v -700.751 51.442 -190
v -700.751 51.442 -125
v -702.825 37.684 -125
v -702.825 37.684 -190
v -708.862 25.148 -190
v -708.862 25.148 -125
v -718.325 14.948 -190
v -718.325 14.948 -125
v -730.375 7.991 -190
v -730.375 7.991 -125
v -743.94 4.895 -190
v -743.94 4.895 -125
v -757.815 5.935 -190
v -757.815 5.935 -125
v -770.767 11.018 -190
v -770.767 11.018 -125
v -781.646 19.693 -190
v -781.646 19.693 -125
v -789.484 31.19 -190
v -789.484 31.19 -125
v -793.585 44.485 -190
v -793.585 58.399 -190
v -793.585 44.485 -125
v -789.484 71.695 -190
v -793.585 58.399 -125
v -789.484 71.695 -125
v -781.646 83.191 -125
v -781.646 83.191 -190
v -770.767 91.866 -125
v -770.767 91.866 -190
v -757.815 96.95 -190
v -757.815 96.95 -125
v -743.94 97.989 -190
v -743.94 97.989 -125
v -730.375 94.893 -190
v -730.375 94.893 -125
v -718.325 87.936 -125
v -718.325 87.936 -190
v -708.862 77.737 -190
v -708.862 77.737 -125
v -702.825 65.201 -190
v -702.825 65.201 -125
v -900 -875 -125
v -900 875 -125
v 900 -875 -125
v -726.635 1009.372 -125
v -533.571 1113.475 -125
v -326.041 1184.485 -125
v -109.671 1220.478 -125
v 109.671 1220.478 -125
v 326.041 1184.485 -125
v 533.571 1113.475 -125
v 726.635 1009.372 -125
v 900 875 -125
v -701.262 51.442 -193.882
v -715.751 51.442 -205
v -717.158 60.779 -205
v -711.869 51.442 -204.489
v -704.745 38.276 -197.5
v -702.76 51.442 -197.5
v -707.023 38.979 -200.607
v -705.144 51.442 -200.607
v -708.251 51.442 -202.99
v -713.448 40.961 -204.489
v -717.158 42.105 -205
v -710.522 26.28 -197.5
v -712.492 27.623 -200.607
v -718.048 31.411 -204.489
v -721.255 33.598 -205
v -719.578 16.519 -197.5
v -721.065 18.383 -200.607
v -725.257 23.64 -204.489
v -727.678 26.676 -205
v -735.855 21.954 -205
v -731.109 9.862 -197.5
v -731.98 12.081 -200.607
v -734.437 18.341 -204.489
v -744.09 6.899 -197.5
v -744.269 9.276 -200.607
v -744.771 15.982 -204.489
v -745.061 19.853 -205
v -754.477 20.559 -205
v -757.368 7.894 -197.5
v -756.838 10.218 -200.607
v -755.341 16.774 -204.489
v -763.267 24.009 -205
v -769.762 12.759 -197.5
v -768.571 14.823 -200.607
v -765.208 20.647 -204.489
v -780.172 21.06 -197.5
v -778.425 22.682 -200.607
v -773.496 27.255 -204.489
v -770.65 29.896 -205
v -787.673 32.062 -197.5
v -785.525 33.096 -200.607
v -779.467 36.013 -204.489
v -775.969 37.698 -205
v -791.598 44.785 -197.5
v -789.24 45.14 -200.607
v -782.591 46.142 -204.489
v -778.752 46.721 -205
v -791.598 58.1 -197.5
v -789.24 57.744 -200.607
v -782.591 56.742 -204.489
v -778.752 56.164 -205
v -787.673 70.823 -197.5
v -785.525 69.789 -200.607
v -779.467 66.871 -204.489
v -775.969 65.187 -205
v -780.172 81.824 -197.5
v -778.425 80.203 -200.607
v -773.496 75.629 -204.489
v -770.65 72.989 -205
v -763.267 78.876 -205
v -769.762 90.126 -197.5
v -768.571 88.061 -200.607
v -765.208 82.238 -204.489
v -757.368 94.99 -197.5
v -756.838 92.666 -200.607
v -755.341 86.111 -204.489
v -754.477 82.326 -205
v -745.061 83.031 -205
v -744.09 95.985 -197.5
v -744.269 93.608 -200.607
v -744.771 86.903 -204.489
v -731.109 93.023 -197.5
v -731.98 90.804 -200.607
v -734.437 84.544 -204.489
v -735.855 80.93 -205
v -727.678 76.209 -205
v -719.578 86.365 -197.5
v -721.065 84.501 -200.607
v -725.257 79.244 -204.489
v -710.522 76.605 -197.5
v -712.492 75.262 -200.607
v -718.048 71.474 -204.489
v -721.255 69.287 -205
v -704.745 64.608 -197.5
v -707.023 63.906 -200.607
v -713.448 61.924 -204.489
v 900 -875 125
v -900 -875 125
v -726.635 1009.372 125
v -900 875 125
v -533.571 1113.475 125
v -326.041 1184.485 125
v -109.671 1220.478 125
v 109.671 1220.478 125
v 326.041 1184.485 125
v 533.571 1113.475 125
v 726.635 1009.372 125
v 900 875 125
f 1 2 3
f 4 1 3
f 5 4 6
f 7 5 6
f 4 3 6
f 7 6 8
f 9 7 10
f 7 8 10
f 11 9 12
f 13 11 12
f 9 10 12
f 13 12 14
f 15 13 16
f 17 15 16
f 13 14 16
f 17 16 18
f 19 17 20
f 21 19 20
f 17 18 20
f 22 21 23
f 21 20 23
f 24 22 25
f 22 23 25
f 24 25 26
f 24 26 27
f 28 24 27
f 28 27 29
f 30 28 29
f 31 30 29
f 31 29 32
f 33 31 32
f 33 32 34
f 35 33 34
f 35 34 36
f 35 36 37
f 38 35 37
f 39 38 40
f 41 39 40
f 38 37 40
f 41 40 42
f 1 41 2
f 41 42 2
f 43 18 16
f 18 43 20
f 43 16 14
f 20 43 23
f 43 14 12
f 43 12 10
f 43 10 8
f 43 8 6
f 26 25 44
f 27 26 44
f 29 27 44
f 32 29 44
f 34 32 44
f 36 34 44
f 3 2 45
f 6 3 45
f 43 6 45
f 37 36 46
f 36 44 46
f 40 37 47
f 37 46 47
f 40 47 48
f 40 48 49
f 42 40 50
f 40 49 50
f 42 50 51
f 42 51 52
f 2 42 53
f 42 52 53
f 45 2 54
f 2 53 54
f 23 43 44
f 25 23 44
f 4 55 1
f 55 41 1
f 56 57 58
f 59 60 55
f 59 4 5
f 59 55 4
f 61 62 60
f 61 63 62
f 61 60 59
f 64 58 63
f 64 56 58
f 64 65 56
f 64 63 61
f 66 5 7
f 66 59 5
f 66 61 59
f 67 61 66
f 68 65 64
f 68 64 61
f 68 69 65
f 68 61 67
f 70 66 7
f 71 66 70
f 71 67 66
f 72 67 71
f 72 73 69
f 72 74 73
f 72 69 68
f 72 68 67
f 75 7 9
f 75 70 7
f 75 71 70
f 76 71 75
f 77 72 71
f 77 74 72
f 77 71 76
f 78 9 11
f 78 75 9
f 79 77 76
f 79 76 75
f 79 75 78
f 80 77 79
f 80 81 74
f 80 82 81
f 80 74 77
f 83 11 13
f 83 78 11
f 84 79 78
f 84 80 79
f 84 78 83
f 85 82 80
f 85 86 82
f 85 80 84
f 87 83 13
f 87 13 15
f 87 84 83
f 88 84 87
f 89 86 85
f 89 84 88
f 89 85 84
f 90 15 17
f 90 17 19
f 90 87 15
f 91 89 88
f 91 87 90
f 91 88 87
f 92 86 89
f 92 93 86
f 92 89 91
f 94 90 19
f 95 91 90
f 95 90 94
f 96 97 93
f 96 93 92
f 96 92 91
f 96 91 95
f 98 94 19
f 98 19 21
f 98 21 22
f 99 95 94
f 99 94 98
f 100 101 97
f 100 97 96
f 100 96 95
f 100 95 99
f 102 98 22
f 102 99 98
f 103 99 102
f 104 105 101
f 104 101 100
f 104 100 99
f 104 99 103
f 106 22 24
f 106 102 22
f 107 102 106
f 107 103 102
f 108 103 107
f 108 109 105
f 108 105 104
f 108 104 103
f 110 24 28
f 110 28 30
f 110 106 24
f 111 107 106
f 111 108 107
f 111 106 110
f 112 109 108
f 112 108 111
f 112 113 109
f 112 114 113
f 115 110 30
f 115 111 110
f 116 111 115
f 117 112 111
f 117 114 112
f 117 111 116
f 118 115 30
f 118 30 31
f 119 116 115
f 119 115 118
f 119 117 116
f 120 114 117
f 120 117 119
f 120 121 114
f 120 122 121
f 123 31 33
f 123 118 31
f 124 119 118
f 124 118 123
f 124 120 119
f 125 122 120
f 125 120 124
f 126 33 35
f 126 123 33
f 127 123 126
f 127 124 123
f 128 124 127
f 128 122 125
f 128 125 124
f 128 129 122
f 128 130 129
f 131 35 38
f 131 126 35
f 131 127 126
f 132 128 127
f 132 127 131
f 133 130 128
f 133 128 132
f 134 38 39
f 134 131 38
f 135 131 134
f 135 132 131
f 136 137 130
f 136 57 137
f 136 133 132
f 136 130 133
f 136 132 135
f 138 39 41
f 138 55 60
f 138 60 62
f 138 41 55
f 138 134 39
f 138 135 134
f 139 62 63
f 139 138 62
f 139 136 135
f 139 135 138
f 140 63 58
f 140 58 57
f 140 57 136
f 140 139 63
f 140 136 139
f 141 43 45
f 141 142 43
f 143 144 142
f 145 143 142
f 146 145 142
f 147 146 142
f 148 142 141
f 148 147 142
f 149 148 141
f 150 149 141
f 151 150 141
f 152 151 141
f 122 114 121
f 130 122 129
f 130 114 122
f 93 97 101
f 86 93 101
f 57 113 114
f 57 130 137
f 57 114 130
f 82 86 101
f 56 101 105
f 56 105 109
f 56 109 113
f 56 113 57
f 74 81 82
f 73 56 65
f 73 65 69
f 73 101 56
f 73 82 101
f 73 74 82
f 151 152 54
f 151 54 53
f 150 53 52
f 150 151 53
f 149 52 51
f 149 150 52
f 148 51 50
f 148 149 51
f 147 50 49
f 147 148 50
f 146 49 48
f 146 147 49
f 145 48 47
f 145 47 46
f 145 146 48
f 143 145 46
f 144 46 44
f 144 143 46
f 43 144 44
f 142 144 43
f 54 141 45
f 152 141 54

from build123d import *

# Parameters (mm, degrees)
F1_DEPTH = 125
F2_R     = 46.677597
F3_DEPTH = 80
F4_R     = 15


with BuildPart() as f1:
    # F0 (on Top) → F1 (new body, symmetric)
    with BuildSketch(Plane.XY):
        with BuildLine():
            Line((-900, -875), (900, -875))
            Line((900, -875), (900, 875))
            ThreePointArc((900, 875), (0, 1225), (-900, 875))
            Line((-900, 875), (-900, -875))
        make_face()
    extrude(amount=F1_DEPTH, both=True)

    # F2 (on face) → F3 (join)
    with BuildSketch(Plane(origin=(0, 0, -125), x_dir=(1, 0, 0), z_dir=(0, 0, -1))):
        with Locations((-747.428477, -51.44228)):
            Circle(F2_R)
    extrude(amount=F3_DEPTH)

    # F4
    f4_edges = [f1.edges().sort_by_distance(p)[0] for p in [
        (-794.106074, 51.44228, -205),
    ]]
    fillet(f4_edges, radius=F4_R)


solid = f1.part
